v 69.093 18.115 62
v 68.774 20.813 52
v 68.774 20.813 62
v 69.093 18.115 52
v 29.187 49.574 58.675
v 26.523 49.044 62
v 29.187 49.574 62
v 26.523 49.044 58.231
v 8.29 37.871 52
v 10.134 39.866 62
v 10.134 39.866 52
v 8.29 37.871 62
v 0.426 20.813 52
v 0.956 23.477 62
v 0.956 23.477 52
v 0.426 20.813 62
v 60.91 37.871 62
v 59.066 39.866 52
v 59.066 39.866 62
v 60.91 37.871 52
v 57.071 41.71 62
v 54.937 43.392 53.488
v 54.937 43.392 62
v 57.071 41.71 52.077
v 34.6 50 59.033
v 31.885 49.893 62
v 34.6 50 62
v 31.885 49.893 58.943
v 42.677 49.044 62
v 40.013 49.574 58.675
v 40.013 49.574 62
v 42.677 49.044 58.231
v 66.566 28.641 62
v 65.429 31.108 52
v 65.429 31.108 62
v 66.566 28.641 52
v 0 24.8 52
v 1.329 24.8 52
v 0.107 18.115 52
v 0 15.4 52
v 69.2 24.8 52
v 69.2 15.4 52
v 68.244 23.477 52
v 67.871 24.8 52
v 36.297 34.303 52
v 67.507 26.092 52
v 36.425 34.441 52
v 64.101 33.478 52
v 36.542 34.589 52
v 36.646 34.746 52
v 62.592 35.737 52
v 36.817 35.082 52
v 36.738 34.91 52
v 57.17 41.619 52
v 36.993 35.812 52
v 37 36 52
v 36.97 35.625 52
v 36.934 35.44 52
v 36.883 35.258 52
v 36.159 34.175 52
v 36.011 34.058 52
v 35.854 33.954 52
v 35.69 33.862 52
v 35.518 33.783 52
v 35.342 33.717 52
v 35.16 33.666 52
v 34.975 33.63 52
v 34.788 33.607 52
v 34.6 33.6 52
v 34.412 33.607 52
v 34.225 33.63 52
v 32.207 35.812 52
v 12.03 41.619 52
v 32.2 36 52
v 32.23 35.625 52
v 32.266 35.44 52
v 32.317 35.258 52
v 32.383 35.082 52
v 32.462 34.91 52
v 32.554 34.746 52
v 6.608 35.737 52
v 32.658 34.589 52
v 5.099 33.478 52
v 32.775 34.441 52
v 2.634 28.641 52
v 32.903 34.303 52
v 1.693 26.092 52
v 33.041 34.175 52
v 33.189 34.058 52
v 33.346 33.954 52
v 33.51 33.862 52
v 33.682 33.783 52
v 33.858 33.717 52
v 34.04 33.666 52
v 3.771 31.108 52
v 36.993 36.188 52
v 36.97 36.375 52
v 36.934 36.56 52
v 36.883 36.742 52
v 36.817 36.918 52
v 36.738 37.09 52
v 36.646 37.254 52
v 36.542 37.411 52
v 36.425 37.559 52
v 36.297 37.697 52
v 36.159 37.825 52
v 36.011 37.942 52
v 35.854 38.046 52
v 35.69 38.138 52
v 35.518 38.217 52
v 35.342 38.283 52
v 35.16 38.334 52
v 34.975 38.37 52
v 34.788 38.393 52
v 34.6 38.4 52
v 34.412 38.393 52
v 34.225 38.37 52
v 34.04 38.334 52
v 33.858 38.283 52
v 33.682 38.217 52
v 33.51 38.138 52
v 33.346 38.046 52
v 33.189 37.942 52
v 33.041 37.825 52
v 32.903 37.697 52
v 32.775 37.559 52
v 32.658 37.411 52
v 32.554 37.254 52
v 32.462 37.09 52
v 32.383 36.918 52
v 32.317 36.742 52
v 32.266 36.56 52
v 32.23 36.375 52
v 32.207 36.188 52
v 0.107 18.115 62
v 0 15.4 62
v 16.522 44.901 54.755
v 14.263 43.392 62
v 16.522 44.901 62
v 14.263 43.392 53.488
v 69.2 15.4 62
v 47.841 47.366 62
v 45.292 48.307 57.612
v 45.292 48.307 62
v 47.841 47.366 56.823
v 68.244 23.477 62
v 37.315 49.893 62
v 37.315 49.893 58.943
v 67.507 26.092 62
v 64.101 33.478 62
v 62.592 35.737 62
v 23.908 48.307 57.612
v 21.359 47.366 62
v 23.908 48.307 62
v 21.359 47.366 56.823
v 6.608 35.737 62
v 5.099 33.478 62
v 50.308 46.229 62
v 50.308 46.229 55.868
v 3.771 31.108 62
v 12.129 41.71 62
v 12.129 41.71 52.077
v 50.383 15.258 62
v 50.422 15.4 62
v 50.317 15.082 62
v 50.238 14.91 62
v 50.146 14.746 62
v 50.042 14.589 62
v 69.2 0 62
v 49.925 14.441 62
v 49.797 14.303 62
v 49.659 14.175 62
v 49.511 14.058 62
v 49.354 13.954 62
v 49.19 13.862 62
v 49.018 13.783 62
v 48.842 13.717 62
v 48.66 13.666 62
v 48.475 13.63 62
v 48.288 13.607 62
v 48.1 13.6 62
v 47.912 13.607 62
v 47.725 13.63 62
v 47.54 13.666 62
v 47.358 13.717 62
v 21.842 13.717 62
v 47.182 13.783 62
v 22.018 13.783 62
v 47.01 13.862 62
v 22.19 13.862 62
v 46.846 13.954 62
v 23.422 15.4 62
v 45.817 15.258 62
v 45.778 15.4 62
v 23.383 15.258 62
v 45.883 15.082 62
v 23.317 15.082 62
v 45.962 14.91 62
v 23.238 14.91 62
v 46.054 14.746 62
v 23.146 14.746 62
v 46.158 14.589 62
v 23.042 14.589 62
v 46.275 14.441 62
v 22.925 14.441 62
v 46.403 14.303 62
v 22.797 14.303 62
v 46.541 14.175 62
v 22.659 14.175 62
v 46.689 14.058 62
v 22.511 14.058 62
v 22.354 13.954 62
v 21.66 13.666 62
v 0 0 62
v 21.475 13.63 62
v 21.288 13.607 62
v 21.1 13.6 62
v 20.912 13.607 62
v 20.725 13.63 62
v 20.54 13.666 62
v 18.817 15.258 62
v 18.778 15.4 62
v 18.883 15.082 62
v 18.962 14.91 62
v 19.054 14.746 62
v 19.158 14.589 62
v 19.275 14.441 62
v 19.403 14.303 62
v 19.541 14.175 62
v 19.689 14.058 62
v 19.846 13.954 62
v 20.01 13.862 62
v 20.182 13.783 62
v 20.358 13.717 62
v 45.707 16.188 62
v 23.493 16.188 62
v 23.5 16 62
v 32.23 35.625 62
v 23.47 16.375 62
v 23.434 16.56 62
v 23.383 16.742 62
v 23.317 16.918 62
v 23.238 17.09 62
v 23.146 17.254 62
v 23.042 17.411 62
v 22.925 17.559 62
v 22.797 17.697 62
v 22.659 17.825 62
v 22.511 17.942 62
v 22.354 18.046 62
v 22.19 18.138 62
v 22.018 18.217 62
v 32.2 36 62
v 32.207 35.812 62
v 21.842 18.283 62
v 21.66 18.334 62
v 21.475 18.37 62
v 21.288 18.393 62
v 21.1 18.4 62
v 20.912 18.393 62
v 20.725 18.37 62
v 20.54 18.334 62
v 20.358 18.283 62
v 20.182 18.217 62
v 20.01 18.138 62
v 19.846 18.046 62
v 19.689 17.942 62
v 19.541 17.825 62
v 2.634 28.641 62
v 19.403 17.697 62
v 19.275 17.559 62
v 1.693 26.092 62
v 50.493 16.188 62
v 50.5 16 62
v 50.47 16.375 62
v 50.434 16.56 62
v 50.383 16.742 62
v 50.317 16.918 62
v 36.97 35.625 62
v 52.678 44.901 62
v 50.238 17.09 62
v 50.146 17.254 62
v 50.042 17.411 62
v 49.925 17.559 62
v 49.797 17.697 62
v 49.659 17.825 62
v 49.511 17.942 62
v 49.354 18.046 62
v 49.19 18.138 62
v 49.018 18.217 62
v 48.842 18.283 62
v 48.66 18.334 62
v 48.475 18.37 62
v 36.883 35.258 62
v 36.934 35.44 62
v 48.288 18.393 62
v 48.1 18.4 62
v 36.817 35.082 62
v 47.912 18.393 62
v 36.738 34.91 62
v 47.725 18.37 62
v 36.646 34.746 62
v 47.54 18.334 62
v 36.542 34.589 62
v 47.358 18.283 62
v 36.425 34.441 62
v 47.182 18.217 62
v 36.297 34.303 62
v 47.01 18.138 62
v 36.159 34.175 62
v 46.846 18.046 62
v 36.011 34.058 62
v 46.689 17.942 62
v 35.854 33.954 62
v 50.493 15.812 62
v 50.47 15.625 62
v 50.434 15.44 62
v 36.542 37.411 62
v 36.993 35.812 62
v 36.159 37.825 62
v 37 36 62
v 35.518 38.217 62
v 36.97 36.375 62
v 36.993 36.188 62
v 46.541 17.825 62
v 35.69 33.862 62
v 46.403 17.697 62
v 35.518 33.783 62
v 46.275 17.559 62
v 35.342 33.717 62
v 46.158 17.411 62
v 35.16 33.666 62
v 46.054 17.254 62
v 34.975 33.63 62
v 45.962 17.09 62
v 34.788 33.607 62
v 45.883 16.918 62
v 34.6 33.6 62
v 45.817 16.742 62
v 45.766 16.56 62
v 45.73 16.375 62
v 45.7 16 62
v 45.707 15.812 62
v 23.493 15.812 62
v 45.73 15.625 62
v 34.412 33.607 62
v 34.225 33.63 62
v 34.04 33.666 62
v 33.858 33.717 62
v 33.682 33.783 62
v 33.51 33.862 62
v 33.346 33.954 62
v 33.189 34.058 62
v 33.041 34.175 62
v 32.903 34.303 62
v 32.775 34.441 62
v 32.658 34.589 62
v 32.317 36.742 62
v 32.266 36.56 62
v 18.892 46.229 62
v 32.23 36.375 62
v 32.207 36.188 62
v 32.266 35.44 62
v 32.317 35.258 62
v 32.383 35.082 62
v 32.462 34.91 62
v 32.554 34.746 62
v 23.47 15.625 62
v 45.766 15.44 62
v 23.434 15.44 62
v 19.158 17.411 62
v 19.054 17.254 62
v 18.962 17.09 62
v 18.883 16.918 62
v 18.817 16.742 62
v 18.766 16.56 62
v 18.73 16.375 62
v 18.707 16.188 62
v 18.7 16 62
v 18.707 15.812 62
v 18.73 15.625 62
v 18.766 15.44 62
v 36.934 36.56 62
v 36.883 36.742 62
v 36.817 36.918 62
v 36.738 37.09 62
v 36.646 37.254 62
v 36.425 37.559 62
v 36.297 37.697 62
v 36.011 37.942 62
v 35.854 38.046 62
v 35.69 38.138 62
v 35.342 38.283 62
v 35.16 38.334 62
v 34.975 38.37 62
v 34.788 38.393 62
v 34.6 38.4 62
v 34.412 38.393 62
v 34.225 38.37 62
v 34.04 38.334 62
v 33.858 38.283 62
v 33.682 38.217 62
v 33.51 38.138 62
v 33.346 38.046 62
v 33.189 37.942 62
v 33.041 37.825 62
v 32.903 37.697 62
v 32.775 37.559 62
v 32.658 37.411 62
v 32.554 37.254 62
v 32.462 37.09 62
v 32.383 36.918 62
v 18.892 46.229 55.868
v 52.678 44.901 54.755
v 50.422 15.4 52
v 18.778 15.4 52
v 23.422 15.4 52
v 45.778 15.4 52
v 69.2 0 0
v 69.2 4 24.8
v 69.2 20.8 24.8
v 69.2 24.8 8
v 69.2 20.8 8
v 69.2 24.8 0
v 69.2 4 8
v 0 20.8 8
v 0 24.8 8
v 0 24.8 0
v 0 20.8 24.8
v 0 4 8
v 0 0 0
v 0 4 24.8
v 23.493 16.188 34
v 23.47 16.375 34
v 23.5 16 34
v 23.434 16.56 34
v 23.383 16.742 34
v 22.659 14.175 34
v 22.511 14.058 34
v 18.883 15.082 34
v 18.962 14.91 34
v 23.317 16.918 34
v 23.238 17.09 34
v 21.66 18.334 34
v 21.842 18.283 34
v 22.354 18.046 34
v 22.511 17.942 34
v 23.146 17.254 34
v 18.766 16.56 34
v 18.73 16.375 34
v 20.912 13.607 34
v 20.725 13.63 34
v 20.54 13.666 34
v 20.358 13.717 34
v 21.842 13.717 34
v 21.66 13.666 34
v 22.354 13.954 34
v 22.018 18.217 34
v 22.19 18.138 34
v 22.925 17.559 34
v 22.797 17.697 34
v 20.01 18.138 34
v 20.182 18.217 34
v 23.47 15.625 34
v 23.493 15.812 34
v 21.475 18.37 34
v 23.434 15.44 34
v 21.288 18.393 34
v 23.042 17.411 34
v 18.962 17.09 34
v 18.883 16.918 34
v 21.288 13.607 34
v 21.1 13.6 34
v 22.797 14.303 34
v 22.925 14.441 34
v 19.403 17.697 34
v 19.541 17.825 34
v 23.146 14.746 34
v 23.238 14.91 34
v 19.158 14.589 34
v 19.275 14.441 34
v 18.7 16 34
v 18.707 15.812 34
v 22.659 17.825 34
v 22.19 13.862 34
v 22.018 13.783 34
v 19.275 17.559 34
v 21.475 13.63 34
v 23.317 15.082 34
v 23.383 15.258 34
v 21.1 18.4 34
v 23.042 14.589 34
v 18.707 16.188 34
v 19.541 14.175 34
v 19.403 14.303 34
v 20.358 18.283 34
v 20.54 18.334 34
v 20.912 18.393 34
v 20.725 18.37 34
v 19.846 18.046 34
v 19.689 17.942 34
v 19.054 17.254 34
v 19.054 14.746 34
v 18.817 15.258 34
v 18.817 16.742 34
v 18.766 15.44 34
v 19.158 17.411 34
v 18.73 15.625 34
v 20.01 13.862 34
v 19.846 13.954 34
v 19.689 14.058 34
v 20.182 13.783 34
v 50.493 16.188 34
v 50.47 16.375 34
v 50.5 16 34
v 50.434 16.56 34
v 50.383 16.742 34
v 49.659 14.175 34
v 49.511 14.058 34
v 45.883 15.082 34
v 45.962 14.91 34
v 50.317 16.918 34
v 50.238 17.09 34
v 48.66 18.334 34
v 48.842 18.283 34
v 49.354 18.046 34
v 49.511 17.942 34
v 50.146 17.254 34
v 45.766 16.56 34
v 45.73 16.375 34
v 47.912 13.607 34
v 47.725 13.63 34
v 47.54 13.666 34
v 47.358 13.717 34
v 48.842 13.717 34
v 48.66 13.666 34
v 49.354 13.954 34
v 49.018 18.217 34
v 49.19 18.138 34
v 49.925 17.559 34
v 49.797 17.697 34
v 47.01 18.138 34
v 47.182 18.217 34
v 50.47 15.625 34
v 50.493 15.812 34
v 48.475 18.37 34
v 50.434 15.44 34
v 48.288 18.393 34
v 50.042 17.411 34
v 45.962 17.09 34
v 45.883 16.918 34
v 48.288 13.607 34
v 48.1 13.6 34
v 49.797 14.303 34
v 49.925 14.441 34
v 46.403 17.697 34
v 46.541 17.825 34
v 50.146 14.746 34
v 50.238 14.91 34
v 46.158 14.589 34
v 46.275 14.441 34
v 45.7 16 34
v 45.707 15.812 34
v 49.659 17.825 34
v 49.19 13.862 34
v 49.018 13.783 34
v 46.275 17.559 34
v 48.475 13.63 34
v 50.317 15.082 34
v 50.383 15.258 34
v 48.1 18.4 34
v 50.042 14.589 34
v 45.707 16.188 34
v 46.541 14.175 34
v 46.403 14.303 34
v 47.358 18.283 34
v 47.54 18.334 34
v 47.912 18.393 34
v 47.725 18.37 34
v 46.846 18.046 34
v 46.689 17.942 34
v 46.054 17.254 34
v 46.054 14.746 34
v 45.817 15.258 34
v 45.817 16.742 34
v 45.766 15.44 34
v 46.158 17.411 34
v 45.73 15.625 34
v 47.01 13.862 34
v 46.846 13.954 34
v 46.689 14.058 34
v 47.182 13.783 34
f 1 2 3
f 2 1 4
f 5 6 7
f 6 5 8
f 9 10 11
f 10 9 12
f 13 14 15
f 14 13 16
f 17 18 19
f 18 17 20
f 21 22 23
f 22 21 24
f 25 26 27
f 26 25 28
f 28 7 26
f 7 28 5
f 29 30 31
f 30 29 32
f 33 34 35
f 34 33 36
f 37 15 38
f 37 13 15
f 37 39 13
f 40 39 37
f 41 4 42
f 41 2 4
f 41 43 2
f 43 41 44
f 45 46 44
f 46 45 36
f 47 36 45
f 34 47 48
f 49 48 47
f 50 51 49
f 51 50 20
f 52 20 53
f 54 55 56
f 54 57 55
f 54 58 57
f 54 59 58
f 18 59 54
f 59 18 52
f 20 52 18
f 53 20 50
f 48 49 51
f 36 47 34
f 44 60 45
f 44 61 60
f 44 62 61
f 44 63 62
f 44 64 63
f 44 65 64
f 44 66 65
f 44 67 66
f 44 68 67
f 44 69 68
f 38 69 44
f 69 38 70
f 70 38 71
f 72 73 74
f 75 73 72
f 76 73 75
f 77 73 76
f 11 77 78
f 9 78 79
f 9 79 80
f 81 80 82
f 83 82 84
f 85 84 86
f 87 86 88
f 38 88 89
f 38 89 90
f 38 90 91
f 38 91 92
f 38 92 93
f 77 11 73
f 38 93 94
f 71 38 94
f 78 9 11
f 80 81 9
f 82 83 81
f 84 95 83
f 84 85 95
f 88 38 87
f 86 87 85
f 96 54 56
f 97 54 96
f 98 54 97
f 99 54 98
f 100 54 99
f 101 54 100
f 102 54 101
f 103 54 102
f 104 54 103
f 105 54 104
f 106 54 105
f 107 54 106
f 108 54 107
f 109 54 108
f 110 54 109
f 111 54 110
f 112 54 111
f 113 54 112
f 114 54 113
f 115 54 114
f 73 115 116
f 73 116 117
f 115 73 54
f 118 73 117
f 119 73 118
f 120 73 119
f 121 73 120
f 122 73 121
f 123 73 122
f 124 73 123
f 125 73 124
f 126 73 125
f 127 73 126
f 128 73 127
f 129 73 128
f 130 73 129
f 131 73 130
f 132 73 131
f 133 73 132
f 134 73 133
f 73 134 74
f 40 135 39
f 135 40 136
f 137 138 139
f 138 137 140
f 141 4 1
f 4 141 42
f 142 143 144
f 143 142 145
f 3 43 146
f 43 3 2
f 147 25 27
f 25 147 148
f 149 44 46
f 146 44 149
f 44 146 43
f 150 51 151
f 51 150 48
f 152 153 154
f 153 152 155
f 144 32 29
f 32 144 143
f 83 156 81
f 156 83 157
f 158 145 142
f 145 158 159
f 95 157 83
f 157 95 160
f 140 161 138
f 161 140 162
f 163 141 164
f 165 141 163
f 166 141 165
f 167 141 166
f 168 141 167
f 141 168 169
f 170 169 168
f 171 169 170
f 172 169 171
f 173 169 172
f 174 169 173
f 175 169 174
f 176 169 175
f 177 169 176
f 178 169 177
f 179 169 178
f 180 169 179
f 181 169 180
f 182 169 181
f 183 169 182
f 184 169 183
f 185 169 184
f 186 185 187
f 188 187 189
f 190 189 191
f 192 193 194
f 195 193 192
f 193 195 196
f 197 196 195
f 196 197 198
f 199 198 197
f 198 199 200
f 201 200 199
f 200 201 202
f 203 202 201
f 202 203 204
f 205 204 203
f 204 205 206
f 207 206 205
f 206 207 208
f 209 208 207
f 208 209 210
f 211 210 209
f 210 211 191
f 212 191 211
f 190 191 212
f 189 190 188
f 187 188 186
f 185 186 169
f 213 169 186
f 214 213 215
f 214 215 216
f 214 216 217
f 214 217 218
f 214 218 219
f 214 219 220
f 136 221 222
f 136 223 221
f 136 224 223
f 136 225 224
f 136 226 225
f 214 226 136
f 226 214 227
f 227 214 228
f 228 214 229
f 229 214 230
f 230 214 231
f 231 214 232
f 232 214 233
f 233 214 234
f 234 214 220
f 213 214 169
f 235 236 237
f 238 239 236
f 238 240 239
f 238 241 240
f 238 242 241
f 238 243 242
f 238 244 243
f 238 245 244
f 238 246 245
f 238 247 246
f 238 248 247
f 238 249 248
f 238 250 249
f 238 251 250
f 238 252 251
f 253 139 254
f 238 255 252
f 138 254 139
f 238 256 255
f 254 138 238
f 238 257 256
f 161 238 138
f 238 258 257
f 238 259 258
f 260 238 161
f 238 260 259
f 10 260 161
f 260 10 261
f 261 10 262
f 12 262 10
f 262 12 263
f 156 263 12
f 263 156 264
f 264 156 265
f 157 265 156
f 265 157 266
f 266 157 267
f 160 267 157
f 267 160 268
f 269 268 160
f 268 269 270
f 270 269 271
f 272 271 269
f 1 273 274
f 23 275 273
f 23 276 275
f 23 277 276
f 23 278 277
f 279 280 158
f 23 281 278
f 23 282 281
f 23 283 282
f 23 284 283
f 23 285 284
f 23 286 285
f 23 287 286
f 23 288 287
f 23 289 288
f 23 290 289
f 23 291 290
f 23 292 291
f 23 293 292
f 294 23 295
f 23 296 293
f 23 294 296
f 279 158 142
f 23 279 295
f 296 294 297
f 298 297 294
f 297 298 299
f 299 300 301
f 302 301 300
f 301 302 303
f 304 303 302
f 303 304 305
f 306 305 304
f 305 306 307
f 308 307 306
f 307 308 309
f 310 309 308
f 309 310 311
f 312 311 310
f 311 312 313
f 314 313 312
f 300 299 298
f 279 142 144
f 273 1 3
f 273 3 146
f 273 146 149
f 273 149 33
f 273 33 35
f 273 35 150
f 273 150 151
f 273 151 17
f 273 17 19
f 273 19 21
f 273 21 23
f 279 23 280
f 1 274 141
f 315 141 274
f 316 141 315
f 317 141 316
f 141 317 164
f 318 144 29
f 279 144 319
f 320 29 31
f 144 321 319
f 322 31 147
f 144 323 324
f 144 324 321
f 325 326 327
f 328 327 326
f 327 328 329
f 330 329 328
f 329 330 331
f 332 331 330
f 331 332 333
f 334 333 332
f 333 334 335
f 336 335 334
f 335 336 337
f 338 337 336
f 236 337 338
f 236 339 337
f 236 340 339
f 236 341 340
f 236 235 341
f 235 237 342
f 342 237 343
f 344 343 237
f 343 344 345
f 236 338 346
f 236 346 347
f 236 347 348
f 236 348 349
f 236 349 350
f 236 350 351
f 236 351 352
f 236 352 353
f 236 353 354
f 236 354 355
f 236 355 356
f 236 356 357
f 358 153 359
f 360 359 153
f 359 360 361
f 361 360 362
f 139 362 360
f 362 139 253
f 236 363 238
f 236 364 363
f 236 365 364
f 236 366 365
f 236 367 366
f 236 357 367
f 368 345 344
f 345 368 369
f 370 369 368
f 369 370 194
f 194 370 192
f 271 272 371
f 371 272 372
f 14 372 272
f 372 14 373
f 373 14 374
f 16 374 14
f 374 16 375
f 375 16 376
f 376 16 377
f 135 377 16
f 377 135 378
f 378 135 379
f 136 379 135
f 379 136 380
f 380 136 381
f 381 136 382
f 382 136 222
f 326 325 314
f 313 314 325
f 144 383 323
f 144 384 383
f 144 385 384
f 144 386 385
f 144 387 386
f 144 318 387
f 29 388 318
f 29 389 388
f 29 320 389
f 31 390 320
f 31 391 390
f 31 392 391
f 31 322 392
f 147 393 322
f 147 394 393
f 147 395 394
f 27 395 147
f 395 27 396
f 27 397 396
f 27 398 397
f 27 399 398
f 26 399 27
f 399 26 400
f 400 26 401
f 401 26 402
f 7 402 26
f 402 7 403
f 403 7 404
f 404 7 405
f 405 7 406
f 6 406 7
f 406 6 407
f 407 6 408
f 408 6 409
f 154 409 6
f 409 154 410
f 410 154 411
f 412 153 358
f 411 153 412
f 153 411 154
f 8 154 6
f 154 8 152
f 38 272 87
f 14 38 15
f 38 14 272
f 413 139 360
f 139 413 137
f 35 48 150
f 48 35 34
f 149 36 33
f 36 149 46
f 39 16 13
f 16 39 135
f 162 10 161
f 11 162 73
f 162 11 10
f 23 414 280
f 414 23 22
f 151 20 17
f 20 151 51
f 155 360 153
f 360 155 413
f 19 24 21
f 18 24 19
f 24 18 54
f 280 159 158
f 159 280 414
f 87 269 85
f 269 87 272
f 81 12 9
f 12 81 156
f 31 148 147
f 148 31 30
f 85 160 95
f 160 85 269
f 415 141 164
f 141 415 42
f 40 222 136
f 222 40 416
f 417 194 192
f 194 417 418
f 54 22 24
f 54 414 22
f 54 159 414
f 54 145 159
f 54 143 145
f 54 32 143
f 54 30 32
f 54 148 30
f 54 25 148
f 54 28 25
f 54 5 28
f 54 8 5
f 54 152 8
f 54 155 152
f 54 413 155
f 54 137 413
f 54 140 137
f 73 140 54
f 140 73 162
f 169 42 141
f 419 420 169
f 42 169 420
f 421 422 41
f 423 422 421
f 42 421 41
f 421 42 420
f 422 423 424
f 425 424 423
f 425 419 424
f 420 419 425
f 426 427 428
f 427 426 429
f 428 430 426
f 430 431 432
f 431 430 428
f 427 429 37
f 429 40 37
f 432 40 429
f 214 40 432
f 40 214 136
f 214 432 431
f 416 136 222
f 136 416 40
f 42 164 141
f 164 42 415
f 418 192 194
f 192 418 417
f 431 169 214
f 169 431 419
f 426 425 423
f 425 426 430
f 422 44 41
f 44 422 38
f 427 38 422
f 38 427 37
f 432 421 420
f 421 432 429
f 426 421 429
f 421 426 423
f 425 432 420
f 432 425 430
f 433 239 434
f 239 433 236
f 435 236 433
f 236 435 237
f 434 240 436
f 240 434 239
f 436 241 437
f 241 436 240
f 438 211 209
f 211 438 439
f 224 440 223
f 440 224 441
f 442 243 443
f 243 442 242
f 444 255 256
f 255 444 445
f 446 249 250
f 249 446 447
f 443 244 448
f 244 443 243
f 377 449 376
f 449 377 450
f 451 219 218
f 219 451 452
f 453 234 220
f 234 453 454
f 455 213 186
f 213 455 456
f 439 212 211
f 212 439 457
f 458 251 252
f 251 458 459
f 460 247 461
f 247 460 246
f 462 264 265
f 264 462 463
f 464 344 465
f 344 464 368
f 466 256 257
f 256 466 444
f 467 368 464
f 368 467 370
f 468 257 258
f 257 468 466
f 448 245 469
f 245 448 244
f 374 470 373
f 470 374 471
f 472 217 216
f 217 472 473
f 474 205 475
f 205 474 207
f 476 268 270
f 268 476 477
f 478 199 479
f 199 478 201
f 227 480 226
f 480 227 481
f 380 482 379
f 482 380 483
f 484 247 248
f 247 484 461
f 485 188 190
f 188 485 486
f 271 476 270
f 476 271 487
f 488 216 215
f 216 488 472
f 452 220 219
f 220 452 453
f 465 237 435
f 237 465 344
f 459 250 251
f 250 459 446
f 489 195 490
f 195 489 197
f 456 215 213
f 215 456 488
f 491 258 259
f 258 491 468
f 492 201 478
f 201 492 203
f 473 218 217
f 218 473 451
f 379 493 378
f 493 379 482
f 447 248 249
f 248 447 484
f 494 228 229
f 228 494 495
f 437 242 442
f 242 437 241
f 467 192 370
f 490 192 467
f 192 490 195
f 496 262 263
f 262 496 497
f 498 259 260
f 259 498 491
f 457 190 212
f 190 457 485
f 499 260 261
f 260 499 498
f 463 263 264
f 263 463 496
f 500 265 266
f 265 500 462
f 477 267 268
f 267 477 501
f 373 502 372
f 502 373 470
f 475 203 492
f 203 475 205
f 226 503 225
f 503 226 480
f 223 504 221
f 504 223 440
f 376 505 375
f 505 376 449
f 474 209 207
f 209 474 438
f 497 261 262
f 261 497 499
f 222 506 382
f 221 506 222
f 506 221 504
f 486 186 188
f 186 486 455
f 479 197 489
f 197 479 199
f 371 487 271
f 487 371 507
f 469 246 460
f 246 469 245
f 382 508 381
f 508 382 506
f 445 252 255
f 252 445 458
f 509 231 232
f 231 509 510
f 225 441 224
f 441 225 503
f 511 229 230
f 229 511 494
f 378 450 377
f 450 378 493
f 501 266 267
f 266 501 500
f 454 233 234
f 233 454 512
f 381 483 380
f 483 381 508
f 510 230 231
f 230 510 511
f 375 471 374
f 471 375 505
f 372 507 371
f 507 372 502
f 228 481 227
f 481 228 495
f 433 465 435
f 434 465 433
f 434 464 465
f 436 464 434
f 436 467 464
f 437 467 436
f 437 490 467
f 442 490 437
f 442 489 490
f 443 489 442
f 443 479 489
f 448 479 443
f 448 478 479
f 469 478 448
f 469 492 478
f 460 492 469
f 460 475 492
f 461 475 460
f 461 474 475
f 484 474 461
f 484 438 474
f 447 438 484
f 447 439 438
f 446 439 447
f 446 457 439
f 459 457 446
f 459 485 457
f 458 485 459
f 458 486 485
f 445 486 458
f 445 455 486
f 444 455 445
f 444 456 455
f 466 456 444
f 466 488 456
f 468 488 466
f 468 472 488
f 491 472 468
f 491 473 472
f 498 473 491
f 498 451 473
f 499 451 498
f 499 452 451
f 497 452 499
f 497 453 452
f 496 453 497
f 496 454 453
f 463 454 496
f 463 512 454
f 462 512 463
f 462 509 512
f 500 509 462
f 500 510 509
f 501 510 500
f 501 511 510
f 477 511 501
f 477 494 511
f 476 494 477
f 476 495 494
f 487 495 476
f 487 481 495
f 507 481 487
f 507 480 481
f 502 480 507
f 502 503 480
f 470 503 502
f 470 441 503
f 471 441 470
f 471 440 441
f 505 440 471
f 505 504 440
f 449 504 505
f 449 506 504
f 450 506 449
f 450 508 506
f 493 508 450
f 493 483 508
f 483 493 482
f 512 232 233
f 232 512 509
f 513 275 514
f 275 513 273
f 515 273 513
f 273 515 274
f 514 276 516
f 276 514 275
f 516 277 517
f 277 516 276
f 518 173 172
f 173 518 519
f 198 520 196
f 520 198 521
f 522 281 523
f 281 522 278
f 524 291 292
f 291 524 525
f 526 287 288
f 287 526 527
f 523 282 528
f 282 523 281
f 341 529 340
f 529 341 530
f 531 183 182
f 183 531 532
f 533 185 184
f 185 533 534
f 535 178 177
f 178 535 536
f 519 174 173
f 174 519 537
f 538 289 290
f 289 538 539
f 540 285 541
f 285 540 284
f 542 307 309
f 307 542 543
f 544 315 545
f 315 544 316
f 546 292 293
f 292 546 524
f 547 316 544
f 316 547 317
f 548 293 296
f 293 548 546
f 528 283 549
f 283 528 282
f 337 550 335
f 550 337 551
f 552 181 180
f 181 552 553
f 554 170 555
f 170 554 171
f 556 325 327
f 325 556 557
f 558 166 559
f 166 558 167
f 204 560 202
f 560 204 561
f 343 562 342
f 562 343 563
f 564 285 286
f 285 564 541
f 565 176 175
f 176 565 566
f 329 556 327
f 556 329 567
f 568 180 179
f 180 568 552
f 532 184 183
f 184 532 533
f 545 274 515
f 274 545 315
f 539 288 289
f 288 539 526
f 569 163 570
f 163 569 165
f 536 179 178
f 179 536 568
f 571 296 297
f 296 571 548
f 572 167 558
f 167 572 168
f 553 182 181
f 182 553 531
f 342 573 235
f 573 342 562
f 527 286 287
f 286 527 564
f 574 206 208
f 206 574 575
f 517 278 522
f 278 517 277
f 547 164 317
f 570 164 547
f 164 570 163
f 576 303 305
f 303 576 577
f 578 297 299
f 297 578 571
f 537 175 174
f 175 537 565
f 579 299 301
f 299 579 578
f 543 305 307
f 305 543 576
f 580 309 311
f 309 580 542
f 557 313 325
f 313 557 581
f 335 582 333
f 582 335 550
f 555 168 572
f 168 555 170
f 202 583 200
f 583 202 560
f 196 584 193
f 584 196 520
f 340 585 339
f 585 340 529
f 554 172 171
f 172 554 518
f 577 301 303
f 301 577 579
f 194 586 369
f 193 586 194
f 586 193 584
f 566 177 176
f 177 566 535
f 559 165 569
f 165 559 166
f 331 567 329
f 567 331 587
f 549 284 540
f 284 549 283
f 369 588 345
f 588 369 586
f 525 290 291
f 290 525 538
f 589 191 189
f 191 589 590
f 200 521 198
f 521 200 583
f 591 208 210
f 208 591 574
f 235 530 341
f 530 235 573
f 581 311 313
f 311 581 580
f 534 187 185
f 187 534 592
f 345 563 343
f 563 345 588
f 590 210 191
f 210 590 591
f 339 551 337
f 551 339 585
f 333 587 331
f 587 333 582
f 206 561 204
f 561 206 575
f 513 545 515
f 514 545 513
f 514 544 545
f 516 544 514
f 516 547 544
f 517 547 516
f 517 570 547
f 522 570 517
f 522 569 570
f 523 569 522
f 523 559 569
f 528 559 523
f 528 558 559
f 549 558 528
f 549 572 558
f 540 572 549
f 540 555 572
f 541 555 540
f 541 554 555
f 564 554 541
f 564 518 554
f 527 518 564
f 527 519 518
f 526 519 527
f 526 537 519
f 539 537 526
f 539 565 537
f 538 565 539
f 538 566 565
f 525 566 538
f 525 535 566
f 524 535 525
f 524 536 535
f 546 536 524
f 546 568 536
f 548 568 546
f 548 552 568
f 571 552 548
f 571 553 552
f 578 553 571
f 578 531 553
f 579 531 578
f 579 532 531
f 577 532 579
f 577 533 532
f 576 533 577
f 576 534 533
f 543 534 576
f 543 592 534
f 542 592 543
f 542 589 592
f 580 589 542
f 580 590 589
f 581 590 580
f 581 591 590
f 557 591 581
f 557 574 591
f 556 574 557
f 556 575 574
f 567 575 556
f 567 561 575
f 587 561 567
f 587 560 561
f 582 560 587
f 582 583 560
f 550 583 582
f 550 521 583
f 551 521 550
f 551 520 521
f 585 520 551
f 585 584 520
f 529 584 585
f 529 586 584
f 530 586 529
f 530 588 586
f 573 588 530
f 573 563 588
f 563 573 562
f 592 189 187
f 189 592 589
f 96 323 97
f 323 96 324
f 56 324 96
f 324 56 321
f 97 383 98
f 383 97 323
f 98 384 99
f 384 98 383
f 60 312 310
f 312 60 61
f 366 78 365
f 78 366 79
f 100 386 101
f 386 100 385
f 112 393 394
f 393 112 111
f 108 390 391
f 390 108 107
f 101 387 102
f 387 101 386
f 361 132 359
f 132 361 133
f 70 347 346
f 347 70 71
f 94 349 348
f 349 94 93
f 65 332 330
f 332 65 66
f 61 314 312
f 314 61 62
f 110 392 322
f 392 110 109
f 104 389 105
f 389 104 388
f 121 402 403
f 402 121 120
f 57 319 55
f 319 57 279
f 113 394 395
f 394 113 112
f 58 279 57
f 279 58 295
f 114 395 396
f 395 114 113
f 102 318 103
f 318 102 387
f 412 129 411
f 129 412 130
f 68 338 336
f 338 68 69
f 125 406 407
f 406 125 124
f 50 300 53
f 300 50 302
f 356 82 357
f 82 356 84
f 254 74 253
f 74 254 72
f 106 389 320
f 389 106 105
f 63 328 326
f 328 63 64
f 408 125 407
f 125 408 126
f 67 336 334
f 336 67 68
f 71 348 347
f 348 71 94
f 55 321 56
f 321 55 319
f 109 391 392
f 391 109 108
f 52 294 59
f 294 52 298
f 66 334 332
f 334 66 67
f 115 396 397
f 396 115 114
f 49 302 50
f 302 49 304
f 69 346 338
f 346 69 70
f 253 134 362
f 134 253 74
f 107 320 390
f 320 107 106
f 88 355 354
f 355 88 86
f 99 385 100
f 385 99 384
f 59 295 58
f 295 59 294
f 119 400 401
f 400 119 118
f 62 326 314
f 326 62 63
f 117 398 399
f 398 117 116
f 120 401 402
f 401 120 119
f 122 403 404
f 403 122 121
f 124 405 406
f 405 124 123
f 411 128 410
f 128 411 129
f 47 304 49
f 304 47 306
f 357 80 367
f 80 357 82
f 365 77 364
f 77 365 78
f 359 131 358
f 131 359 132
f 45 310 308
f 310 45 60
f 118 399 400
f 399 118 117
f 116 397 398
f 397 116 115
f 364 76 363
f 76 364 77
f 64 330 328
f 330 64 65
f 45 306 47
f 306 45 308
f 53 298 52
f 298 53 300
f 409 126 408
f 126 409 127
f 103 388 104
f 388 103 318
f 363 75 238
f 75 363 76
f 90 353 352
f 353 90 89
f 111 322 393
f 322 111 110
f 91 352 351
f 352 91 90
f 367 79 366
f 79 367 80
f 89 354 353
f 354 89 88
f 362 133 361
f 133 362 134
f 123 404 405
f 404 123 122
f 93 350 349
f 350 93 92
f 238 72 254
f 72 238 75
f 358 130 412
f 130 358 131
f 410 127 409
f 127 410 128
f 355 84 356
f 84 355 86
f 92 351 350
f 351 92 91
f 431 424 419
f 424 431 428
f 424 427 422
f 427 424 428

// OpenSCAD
show_inner_clamp_bolt_hole = false;
show_outer_clamp_bolt_holes = true;


front_offset = 4;
rear_offset = 4;
shaft_width = 16.8;
shaft_height = 16.8;

clamp_height = 44;
clamp_length = 69.2;

lip_width = 0;
lip_offset_bottom = 1;
lip_height = 8;

shaft_bolt_dia = 0;

mount_plate_width = 69.2;
mount_plate_length = 50;
mount_plate_thickness = 10;
mount_plate_offset = 0;
mount_plate_hole_dia = 4.8;
mount_plate_hole_depth = 28;
mount_plate_hole_spacing_rear = 27;
mount_plate_hole_spacing_front = 20;
mount_plate_hole_offset_rear = 16;
mount_plate_front_bevel_angle = -40;
mount_plate_front_bevel_offset = -22;

clamp_tab_width = 8; // ensure clearance for bolt head size + tool
clamp_tab_thickness = 14;
clamp_tab_bolt_hole_dia = 0;
clamp_tab_nut_size = 10.6;
clamp_tab_nut_thickness = 0;
clamp_bolt_spacing = 60;

$fn = 80;


// calculated
clamp_width = front_offset + rear_offset + shaft_width;


module clamp_tab_a() {
    render()
    difference() {
        cube([clamp_length, clamp_tab_thickness, clamp_tab_width], center=false);
        
        // drill the hole for clamp bolts

        if(show_outer_clamp_bolt_holes)
        translate([clamp_length/4, 0, clamp_tab_width/2])
        rotate([0, 90, 90])
        cylinder(h=clamp_tab_thickness, d=clamp_tab_bolt_hole_dia);

        if(show_inner_clamp_bolt_hole)
        translate([clamp_length/2, 0, clamp_tab_width/2])
        rotate([0, 90, 90])
        cylinder(h=clamp_tab_thickness, d=clamp_tab_bolt_hole_dia);

        if(show_outer_clamp_bolt_holes)        
        translate([clamp_length/4*3, 0, clamp_tab_width/2])
        rotate([0, 90, 90])
        cylinder(h=clamp_tab_thickness, d=clamp_tab_bolt_hole_dia);
    }
}


module clamp_tab_b() {
    render()
    difference(){
        cube([clamp_length, clamp_tab_thickness + clamp_tab_nut_thickness, clamp_tab_width], center=false);

        // drill the hole for clamp bolts
        if(show_outer_clamp_bolt_holes)
        translate([clamp_length/4, clamp_tab_nut_thickness, clamp_tab_width/2])
        rotate([0, 90, 90])
        cylinder(h=clamp_tab_thickness, d=clamp_tab_bolt_hole_dia);

        if(show_inner_clamp_bolt_hole)
        translate([clamp_length/2, clamp_tab_nut_thickness, clamp_tab_width/2])
        rotate([0, 90, 90])
        cylinder(h=clamp_tab_thickness, d=clamp_tab_bolt_hole_dia);
        
        if(show_outer_clamp_bolt_holes)
        translate([clamp_length/4*3, clamp_tab_nut_thickness, clamp_tab_width/2])
        rotate([0, 90, 90])
        cylinder(h=clamp_tab_thickness, d=clamp_tab_bolt_hole_dia);

        // drill the nut holders
        if(show_outer_clamp_bolt_holes)
        translate([clamp_length/4, 0, clamp_tab_width/2])
        rotate([0, 90, 90])
        cylinder(h=clamp_tab_nut_thickness, d=clamp_tab_nut_size, $fn=6);

        if(show_inner_clamp_bolt_hole)
        translate([clamp_length/2, 0, clamp_tab_width/2])
        rotate([0, 90, 90])
        cylinder(h=clamp_tab_nut_thickness, d=clamp_tab_nut_size, $fn=6);
        
        if(show_outer_clamp_bolt_holes)
        rotate([0, 0, 0])
        translate([clamp_length/4*3, 0, clamp_tab_width/2])
        rotate([0, 90, 90])
        cylinder(h=clamp_tab_nut_thickness, d=clamp_tab_nut_size, $fn=6);

    }

}

// draw the main block
render()
translate([0, 0, clamp_tab_width])
difference() {
    union() {
        cube([clamp_length, clamp_width, clamp_height]);

        // left lip

        translate([-lip_width, 0, shaft_height + lip_offset_bottom])
        cube([lip_width, clamp_width, lip_height], center=false);


        // right lip
        translate([clamp_length, 0, shaft_height + lip_offset_bottom])
        cube([lip_width, clamp_width, lip_height], center=false);

        // draw the mount plate

        translate([0, mount_plate_offset, 0])
        difference() {

            // draw the mount plate
            union() {
                // draw the semi-circle
                translate([(clamp_length - mount_plate_width) / 2 + mount_plate_width / 2, mount_plate_length - mount_plate_width / 2, clamp_height])
                difference() {
                    cylinder(h=mount_plate_thickness, d=mount_plate_width);
                    
                    translate([-mount_plate_width/2, -mount_plate_width, 0])
                    cube([mount_plate_width, mount_plate_width, mount_plate_thickness], center=false);
                    
                    // subtract the bevel from the front edge
                    translate([mount_plate_width / 2, 0, mount_plate_front_bevel_offset])
                    rotate([mount_plate_front_bevel_angle, 180, 0])
                    cube([mount_plate_width, mount_plate_length, mount_plate_thickness], center=false);
                    
                }

                // draw the back part of the mount plate
                translate([(clamp_length - mount_plate_width) / 2, 0, clamp_height])
                cube([mount_plate_width, mount_plate_length - mount_plate_width / 2, mount_plate_thickness], center=false);
            }

        }

    }

    // cut the hole for the shaft
    translate([0, rear_offset, 0])
    cube([clamp_length, shaft_width, shaft_height]);


    // drill the mount plate holes

    // drill the mount plate bolt hole left rear
    translate([clamp_length / 2 - mount_plate_hole_spacing_rear / 2, mount_plate_offset + mount_plate_hole_offset_rear, clamp_height + mount_plate_thickness - mount_plate_hole_depth])
    cylinder(h=mount_plate_hole_depth, d=mount_plate_hole_dia);

    // drill the mount plate bolt hole right rear
    translate([clamp_length / 2 + mount_plate_hole_spacing_rear / 2, mount_plate_offset + mount_plate_hole_offset_rear, clamp_height + mount_plate_thickness - mount_plate_hole_depth])
    cylinder(h=mount_plate_hole_depth, d=mount_plate_hole_dia);

    // drill the mount plate bolt hole front
    translate([clamp_length / 2, mount_plate_offset + mount_plate_hole_offset_rear + mount_plate_hole_spacing_front, clamp_height + mount_plate_thickness - mount_plate_hole_depth])
    cylinder(h=mount_plate_hole_depth, d=mount_plate_hole_dia);

}

// draw the clamp_tabs
translate([0, clamp_width - clamp_tab_thickness, 0])
clamp_tab_a();

translate([0, 0, 0])
clamp_tab_b();
